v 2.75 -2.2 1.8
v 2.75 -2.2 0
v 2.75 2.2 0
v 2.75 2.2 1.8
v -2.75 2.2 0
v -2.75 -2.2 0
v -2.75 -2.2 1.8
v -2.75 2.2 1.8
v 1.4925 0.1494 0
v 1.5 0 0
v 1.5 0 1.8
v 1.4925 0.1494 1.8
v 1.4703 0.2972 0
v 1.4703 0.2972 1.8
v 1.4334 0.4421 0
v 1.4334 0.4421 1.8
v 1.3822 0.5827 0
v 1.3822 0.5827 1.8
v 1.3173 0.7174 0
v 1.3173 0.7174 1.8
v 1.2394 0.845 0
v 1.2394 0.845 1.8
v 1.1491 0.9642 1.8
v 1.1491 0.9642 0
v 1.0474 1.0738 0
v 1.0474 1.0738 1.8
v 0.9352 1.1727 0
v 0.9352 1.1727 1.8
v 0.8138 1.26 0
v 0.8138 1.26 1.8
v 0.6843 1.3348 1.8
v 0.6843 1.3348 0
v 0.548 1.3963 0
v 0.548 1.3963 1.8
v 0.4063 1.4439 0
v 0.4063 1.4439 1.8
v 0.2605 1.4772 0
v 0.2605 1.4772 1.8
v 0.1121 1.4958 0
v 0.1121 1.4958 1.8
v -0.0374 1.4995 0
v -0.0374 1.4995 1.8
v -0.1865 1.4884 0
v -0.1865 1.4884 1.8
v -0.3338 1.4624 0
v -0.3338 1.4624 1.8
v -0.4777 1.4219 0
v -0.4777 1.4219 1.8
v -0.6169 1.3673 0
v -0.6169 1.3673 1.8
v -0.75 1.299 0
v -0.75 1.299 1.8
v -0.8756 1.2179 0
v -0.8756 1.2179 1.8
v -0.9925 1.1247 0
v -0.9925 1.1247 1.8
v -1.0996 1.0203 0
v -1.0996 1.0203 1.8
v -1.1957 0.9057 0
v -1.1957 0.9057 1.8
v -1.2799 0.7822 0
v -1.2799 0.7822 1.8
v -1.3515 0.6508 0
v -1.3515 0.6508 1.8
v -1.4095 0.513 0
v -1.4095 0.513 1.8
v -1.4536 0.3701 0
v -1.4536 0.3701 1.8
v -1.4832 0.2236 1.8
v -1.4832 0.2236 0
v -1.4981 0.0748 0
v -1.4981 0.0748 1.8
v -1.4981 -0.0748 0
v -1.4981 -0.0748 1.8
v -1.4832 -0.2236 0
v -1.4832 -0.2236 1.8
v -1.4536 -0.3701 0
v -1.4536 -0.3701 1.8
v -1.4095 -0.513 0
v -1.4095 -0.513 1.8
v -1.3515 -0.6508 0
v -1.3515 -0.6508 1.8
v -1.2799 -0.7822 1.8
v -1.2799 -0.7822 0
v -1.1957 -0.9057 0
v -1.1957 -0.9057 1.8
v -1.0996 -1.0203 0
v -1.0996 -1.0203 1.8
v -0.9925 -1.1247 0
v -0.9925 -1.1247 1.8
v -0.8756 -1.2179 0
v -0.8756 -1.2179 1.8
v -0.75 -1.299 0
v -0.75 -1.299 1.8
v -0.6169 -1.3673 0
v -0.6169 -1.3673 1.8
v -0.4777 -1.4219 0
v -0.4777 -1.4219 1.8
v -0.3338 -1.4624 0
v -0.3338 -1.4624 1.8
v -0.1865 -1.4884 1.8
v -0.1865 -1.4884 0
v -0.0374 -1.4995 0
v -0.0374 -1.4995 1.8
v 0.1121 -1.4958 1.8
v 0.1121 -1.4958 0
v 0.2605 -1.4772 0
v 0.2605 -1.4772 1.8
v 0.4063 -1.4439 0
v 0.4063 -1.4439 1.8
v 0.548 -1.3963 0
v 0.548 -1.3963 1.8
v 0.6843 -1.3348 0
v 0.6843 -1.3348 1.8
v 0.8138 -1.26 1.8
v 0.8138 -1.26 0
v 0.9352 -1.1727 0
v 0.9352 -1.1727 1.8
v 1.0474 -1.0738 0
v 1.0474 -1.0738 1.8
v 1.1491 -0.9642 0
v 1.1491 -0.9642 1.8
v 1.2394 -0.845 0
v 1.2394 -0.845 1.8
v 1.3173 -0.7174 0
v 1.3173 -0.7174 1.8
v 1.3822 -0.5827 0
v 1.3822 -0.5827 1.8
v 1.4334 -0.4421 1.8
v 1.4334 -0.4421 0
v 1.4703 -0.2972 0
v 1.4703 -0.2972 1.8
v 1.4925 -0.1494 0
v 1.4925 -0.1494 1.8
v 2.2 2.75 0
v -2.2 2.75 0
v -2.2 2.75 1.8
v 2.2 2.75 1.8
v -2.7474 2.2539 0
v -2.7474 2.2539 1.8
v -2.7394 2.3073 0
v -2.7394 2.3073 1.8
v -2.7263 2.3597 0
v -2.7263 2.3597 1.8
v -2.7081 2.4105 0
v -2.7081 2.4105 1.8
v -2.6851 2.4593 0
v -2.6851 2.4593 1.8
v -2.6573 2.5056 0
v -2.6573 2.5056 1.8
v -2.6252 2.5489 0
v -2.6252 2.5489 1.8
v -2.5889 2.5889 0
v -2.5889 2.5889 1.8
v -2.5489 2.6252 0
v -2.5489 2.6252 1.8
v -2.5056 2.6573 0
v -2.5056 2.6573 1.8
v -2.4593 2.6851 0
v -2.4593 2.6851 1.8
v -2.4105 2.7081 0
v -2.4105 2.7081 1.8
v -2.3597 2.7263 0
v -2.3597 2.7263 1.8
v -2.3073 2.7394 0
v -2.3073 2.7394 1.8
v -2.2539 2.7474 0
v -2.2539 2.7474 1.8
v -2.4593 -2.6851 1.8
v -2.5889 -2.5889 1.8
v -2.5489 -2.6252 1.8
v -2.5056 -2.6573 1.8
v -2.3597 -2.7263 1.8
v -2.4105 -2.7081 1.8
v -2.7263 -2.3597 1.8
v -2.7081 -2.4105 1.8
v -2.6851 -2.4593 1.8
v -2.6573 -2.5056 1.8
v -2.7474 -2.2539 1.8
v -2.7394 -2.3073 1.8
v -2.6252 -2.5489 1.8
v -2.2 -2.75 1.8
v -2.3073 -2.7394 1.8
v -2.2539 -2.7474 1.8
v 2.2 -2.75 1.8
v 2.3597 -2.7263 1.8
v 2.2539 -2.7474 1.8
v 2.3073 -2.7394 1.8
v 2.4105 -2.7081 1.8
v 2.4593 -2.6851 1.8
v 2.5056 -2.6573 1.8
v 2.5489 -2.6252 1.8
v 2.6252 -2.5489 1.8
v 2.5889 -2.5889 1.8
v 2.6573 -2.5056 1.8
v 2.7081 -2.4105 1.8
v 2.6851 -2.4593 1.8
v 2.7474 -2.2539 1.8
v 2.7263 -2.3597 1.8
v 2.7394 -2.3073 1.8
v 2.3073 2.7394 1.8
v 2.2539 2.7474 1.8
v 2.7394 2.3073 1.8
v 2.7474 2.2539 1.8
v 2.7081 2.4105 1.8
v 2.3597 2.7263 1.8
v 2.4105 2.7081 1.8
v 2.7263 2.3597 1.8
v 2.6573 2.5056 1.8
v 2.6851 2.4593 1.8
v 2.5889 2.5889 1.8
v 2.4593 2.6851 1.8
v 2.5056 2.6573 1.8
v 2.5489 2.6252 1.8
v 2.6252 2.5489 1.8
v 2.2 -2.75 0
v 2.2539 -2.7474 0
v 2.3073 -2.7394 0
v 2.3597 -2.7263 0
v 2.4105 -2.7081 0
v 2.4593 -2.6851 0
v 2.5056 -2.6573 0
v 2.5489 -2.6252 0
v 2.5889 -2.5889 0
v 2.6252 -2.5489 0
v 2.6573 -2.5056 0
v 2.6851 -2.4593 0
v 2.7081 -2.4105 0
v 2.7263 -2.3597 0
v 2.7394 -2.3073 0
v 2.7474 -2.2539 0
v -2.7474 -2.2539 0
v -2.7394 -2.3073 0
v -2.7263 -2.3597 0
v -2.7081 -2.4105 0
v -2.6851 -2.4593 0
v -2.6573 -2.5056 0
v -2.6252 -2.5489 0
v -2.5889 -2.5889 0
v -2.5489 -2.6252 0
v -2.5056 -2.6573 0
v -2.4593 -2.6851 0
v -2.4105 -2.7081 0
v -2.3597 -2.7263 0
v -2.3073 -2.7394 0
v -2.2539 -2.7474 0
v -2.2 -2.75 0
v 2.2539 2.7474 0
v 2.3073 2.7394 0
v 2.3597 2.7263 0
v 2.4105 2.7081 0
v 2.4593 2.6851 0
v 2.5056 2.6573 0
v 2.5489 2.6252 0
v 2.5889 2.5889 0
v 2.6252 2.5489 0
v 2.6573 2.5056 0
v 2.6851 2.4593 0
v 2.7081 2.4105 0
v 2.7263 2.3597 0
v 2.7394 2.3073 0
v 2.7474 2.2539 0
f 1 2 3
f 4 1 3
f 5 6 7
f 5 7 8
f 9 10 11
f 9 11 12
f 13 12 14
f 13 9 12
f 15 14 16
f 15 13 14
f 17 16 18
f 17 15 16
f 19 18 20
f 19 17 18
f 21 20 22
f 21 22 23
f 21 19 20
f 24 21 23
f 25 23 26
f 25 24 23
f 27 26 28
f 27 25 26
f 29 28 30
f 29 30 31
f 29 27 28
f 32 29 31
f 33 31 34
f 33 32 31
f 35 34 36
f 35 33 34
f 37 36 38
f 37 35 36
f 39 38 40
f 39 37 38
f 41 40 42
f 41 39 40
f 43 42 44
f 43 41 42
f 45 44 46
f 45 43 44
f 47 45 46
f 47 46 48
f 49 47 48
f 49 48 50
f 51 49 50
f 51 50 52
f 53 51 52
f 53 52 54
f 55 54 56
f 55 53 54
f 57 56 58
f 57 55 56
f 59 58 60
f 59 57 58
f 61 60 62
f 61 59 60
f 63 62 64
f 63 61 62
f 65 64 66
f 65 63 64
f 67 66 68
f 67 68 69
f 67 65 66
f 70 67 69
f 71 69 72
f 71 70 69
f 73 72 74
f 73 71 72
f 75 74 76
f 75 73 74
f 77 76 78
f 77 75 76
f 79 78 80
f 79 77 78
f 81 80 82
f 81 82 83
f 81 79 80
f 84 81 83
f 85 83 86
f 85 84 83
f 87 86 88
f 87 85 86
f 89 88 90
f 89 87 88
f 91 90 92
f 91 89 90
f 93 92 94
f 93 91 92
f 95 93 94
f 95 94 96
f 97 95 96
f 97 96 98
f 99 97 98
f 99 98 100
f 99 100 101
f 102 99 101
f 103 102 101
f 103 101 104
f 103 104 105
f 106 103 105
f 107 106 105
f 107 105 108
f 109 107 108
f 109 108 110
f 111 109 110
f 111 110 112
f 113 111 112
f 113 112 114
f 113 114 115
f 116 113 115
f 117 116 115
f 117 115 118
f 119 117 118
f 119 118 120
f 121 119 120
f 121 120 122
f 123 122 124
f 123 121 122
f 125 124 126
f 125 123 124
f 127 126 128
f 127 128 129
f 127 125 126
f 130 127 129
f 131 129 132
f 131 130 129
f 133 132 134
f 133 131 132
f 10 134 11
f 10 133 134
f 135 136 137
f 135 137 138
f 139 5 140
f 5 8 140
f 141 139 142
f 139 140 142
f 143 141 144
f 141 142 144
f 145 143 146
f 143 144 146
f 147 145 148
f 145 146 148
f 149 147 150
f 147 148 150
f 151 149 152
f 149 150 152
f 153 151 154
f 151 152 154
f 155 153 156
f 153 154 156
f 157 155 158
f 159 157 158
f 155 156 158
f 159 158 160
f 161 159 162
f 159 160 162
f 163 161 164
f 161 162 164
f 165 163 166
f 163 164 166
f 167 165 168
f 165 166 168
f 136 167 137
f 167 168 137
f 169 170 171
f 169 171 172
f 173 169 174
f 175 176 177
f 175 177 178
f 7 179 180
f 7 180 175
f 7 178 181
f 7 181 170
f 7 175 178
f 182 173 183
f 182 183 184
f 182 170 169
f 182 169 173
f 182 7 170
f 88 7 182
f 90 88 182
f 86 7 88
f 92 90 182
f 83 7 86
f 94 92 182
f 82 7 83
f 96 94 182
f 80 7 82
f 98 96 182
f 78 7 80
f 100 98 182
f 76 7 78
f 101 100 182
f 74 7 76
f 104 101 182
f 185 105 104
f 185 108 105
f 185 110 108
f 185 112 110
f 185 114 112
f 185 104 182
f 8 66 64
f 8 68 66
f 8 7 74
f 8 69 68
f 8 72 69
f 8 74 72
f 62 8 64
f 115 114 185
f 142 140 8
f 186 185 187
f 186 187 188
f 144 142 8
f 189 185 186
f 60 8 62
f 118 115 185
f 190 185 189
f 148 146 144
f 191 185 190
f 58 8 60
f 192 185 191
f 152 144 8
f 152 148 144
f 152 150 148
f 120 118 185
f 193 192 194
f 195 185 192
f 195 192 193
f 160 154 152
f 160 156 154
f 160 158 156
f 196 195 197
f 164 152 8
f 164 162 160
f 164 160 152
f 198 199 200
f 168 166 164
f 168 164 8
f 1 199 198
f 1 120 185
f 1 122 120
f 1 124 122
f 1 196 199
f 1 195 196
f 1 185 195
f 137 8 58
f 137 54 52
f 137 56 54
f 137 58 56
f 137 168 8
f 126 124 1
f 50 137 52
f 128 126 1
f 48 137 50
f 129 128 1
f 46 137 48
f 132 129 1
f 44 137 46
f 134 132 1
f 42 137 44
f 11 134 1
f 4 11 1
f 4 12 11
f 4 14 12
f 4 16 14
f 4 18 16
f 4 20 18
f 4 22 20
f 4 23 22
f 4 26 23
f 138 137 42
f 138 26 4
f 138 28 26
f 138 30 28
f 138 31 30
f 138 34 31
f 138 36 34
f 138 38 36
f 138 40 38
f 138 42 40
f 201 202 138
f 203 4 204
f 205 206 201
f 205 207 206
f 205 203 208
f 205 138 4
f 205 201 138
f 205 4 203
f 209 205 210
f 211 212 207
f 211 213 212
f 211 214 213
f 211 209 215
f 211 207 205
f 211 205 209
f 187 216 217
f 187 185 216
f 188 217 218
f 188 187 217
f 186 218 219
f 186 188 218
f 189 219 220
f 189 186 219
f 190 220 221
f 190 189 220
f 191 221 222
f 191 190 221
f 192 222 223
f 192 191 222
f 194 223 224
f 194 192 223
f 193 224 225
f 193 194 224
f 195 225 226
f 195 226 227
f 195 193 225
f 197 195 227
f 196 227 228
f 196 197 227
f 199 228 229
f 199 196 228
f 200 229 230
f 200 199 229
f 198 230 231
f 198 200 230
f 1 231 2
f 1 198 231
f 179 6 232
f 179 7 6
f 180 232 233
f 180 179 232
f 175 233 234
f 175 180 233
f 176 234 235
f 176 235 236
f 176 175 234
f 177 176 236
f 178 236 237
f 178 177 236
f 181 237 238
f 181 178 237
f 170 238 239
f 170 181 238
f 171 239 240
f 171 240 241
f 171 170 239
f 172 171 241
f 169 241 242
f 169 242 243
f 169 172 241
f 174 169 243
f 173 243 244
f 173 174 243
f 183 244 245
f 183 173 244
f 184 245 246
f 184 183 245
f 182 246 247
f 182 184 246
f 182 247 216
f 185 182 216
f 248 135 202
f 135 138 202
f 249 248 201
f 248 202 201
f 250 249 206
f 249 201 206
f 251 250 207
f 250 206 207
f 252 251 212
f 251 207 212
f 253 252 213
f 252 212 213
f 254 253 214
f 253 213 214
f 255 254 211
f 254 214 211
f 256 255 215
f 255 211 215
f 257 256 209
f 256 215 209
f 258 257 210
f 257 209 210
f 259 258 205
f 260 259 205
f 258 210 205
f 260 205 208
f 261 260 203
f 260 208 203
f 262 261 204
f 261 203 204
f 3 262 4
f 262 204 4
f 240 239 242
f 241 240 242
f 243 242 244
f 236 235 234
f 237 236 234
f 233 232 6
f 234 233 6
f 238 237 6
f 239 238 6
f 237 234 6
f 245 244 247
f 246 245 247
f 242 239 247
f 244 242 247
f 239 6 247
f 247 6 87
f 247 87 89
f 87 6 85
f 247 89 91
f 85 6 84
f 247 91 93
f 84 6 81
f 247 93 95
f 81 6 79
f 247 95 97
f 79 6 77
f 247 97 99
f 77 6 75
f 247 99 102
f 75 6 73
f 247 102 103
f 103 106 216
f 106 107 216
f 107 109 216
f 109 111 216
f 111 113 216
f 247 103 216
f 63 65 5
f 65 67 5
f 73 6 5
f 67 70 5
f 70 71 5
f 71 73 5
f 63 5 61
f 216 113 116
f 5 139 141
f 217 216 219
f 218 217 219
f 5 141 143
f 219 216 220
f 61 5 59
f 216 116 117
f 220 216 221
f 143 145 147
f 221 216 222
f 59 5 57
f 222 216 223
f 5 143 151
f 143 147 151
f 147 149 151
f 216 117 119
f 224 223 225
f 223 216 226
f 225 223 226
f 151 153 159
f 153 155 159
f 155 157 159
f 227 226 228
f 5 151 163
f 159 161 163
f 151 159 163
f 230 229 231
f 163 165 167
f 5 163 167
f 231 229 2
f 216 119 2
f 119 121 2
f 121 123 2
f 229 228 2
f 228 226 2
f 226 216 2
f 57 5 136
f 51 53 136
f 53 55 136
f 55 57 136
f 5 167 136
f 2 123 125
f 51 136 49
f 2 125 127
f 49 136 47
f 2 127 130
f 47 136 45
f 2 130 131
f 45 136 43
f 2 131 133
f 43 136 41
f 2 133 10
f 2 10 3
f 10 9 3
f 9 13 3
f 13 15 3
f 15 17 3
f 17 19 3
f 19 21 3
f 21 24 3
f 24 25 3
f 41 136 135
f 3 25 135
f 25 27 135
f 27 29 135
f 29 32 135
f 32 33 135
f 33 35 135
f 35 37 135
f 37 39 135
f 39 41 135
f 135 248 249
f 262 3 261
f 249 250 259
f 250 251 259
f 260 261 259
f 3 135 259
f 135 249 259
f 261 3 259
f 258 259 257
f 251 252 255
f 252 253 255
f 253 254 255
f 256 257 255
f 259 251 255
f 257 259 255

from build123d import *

# Parameters (mm, degrees)
SKETCH1_W           = 5.5
SKETCH1_H           = 5.5
SKETCH1_R           = 1.5
BOSS_EXTRUDE1_DEPTH = 1.8
FILLET1_R           = 0.55


with BuildPart() as part:
    # Sketch1 → Boss-Extrude1 (new body)
    with BuildSketch(Plane.XY):
        Rectangle(SKETCH1_W, SKETCH1_H)
        Circle(SKETCH1_R, mode=Mode.SUBTRACT)
    extrude(amount=BOSS_EXTRUDE1_DEPTH)

    # Fillet1
    fillet1_edges = [part.edges().sort_by_distance(p)[0] for p in [
        (2.75, -2.75, 0.9),
        (-2.75, -2.75, 0.9),
        (-2.75, 2.75, 0.9),
        (2.75, 2.75, 0.9),
    ]]
    fillet(fillet1_edges, radius=FILLET1_R)


solid = part.part
